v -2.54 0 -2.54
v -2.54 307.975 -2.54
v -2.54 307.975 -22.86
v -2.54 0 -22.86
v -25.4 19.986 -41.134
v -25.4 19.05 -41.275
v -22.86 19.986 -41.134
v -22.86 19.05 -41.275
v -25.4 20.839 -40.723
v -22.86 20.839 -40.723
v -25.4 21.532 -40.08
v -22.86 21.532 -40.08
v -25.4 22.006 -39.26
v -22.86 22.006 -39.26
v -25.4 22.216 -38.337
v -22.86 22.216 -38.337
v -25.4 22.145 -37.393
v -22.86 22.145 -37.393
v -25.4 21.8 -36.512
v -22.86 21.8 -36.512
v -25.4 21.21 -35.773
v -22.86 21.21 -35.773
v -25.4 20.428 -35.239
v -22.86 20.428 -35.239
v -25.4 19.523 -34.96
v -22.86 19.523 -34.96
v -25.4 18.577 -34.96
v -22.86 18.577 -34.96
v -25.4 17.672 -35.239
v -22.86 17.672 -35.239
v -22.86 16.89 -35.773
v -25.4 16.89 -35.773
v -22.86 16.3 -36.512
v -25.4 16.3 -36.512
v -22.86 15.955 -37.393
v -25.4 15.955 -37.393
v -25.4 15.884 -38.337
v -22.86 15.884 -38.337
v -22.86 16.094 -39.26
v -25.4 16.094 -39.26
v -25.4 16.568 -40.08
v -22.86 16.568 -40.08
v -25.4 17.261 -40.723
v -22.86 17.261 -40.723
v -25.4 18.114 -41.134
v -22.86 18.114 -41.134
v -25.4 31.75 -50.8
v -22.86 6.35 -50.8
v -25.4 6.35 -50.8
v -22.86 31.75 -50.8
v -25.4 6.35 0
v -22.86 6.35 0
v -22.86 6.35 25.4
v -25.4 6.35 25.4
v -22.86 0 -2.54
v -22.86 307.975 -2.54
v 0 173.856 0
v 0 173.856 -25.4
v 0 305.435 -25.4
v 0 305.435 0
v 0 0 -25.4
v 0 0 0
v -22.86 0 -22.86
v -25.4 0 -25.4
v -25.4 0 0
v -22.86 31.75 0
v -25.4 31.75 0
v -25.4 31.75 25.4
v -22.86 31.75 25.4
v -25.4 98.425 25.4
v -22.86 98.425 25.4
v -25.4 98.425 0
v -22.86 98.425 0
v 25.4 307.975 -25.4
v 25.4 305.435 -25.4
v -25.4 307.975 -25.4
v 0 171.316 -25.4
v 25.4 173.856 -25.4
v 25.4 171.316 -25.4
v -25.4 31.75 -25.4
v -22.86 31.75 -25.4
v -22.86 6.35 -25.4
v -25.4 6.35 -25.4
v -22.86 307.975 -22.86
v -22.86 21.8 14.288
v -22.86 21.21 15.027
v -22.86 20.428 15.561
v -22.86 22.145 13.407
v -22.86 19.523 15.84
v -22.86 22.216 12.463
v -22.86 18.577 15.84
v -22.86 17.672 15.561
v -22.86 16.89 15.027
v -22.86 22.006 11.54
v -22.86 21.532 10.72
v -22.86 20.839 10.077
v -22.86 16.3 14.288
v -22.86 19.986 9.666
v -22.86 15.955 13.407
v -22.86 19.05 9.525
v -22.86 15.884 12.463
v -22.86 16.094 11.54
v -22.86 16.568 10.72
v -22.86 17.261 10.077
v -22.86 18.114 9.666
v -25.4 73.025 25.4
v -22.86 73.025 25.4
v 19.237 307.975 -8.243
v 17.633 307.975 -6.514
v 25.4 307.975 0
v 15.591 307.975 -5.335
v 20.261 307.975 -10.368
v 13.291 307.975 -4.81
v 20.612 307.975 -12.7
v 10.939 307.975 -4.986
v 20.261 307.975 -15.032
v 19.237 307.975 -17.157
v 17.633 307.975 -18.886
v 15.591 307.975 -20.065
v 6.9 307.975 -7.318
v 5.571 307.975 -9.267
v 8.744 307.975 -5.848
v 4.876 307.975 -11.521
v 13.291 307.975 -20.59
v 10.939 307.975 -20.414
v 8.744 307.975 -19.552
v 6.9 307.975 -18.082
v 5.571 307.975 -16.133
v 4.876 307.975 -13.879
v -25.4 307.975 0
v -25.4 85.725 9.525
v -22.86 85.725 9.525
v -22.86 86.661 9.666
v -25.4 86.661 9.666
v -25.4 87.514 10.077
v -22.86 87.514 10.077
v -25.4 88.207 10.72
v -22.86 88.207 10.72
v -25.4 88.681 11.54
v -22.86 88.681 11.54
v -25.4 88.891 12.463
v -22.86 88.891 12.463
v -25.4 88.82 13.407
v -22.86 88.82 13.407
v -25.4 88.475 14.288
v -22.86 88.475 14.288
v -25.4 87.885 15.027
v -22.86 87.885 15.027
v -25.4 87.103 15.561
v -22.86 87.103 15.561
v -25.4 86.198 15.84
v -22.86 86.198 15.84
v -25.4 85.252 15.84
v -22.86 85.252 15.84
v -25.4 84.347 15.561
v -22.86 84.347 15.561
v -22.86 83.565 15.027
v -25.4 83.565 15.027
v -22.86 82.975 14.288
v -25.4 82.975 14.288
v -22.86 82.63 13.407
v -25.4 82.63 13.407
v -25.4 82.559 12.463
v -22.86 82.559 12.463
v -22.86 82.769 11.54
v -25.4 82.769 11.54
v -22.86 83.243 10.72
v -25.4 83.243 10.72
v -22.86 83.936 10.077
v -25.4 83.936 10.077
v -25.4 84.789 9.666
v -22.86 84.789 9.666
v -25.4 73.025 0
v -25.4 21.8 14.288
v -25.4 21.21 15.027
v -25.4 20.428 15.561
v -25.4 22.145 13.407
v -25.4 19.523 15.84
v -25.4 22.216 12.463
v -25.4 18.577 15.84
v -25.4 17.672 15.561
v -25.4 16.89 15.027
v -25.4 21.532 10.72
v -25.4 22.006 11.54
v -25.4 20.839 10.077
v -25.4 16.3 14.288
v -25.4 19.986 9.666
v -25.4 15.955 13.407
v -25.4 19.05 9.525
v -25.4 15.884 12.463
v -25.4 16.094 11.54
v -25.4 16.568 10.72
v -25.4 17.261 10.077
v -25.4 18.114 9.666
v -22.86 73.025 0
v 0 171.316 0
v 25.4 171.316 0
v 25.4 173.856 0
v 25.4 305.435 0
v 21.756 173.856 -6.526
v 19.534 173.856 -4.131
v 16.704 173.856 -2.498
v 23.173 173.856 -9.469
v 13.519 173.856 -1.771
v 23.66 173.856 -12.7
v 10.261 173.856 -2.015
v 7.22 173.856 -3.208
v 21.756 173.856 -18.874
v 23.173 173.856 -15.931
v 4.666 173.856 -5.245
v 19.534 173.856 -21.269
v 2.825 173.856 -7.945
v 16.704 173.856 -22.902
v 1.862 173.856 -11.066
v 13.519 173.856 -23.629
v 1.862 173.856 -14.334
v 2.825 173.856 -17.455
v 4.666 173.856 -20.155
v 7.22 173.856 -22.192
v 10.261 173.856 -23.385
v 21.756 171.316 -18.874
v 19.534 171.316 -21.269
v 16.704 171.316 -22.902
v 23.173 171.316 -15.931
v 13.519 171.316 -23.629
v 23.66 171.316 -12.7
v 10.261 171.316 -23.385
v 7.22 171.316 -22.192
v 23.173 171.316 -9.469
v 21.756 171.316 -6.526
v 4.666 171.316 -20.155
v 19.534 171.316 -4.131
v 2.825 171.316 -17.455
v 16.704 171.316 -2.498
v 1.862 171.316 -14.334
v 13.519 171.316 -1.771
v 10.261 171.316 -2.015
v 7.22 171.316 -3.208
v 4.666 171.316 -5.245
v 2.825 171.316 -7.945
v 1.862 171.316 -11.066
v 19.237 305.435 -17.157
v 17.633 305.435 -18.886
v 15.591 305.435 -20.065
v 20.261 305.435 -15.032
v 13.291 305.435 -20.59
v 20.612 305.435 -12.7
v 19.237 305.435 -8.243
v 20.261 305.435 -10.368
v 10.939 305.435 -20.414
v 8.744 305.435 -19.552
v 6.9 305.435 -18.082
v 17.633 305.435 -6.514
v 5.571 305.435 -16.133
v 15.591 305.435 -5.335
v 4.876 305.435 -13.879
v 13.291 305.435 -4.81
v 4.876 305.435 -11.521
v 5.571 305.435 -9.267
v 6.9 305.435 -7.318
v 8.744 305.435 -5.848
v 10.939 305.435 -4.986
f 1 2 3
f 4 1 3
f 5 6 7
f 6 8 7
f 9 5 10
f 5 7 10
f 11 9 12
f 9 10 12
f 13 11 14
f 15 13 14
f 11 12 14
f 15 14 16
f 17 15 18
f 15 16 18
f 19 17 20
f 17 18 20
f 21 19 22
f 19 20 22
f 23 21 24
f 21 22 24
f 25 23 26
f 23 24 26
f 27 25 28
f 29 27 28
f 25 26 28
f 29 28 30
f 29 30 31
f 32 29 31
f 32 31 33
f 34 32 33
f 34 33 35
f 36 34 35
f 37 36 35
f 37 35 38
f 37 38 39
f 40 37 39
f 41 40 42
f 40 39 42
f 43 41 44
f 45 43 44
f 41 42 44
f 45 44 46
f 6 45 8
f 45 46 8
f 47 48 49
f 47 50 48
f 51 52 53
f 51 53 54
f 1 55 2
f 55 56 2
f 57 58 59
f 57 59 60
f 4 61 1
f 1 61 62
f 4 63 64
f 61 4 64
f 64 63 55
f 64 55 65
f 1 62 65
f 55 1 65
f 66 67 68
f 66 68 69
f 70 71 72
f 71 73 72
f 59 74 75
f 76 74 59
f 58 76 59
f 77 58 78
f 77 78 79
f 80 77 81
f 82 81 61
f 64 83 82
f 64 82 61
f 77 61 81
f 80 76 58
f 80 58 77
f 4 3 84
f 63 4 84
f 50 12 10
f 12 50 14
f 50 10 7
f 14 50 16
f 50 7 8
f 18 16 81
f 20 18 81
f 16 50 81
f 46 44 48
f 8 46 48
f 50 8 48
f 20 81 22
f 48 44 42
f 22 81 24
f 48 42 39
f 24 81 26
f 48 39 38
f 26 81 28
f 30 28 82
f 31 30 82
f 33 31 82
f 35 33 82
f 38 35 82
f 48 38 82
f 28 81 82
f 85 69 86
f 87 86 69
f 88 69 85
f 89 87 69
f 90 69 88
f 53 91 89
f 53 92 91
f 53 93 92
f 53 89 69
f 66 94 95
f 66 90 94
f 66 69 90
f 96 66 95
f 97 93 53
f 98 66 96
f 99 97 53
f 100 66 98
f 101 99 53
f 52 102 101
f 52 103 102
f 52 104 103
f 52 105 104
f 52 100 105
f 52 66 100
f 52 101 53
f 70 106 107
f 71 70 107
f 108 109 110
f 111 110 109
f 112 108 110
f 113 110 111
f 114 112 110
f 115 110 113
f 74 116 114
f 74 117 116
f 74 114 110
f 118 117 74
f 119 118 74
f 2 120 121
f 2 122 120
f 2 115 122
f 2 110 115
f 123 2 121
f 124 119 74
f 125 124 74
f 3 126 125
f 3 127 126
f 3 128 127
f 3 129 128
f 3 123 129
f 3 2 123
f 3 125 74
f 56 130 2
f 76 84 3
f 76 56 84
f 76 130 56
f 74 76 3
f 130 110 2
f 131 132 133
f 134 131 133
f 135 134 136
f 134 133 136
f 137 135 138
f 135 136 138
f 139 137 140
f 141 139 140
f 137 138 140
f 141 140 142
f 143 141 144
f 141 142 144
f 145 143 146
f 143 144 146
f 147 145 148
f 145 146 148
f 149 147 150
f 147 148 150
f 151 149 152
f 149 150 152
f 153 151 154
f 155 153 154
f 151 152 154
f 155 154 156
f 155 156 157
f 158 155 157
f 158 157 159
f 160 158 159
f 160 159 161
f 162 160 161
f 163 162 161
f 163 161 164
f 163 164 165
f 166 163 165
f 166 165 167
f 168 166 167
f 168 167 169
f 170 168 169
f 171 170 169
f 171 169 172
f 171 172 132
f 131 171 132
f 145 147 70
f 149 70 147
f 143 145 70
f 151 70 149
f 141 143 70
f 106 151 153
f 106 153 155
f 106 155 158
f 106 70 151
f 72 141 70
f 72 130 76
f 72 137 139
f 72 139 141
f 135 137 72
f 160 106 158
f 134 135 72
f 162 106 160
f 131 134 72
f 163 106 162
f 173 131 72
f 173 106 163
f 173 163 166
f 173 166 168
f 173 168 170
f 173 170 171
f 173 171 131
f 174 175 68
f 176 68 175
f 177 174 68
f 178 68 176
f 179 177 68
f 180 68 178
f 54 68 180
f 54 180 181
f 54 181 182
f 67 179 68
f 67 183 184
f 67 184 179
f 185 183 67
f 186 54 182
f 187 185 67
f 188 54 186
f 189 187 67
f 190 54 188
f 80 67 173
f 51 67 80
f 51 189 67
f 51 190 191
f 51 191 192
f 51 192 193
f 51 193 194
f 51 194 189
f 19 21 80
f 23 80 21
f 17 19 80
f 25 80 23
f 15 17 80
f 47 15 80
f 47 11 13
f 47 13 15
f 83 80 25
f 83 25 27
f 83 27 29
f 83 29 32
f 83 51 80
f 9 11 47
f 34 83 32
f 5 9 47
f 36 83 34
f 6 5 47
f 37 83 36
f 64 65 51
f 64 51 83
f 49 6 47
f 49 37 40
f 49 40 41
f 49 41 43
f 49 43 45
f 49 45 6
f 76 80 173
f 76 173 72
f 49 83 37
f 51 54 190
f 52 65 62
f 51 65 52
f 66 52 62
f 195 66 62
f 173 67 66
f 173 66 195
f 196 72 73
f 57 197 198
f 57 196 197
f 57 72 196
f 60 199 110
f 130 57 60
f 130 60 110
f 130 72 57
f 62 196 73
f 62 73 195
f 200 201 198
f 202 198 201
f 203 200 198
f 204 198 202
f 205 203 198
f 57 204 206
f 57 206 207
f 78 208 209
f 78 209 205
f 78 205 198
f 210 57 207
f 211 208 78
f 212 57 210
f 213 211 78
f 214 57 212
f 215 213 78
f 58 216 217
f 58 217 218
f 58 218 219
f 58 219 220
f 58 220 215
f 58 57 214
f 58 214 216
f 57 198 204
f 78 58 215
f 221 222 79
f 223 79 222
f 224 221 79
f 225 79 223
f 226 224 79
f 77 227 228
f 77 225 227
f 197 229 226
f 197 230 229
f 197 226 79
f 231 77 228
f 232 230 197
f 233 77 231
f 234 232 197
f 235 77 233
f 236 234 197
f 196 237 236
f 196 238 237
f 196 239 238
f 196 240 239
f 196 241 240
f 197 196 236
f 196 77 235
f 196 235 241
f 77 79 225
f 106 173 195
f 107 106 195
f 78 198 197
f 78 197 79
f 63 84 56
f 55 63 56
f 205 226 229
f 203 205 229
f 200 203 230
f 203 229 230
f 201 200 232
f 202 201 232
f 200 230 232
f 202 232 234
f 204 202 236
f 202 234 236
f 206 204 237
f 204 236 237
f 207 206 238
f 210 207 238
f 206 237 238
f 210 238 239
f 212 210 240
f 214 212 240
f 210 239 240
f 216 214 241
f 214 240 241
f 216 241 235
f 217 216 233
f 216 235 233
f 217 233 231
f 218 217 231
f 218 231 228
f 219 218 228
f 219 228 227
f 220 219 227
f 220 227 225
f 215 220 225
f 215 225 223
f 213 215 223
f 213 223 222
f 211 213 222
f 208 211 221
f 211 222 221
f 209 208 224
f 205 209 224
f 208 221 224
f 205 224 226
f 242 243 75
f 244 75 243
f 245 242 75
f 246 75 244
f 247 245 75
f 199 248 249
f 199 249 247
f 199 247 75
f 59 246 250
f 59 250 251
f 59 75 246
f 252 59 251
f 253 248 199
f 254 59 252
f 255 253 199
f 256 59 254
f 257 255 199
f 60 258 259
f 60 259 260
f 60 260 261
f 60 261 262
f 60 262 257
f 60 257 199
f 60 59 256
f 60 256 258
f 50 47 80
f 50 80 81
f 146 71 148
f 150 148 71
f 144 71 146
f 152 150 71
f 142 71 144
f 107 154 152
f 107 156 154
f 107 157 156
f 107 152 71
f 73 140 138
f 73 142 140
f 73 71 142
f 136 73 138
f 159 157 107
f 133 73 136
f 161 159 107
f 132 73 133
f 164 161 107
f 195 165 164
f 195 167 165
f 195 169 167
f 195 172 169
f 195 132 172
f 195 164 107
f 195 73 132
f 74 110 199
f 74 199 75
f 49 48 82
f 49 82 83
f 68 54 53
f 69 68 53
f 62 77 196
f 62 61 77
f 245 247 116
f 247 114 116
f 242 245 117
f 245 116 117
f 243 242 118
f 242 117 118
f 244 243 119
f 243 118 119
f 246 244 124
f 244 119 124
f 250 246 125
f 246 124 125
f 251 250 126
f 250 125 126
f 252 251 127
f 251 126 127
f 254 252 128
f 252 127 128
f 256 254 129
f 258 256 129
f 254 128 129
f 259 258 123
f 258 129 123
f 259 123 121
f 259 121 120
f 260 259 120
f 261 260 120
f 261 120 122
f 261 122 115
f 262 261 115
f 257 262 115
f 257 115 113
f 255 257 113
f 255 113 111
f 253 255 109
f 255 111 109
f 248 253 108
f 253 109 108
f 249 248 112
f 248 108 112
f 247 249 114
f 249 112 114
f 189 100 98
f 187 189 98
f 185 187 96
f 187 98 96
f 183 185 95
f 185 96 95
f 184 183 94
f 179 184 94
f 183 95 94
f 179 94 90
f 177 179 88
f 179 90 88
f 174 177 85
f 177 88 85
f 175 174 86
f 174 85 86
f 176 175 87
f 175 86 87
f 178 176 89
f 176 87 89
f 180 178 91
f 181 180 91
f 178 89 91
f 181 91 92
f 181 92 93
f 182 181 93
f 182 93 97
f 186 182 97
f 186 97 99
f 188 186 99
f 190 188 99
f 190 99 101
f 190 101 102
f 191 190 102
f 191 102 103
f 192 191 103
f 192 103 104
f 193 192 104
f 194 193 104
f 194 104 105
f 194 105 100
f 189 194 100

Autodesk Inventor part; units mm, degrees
ref_plane "YZ Plane" through (0, 0, 0) normal (1, 0, 0) x (0, 1, 0)
ref_plane "XZ Plane" through (0, 0, 0) normal (0, 1, 0) x (-1, 0, 0)
ref_plane "XY Plane" through (0, 0, 0) normal (0, 0, 1) x (1, 0, 0)
sketch "Sketch1" plane through (0, 0, 0) normal (0, 1, 0) x (-1, 0, 0)
  line L0 (0, 0) -> (25.4, 0)
  line L1 (25.4, 0) -> (25.4, -25.4)
  line L2 (25.4, -25.4) -> (0, -25.4)
  line L3 (0, -25.4) -> (0, 0)
  dimension "d0" = 25.4
  dimension "d1" = 25.4
extrude "Extrusion1" add sketch "Sketch1" along normal blind 307.975
sketch "Sketch2" plane through (0, 307.975, 0) normal (0, 1, 0) x (1, 0, 0)
  line L0 (-22.86, 2.54) -> (-2.54, 2.54)
  line L1 (-2.54, 2.54) -> (-2.54, 22.86)
  line L2 (-2.54, 22.86) -> (-22.86, 22.86)
  line L3 (-22.86, 22.86) -> (-22.86, 2.54)
  line L4 (-25.4, 0) -> (0, 0) projected
  line L5 (-25.4, 25.4) -> (-25.4, 0) projected
  dimension "d4" = 20.32
  dimension "d5" = 20.32
  dimension "d6" = 2.54
  dimension "d7" = 2.54
extrude "Extrusion2" cut sketch "Sketch2" against normal blind 307.975
sketch "Sketch3" plane through (0, 0, 0) normal (1, 0, 0) x (0, 0, -1)
  line L0 (0, 0) -> (0, 307.975) projected
  line L1 (0, 307.975) -> (25.4, 307.975)
  line L2 (25.4, 307.975) -> (25.4, 305.435)
  line L3 (25.4, 305.435) -> (0, 305.435)
  line L4 (0, 305.435) -> (0, 307.975)
  dimension "d10" = 25.4
  dimension "d11" = 2.54
extrude "Extrusion3" add sketch "Sketch3" along normal blind 25.4
sketch "Sketch4" plane through (0, 307.975, 0) normal (0, 1, 0) x (1, 0, 0)
  circle A0 centre (12.7, 12.7) radius 7.9121
  line L0 (-25.4, 0) -> (25.4, 0) projected
  line L1 (25.4, 25.4) -> (25.4, 0) projected
  point P0 (0, 0)
  dimension "d14" = 15.8242
  dimension "d15" = 12.7
  dimension "d16" = 12.7
extrude "Extrusion4" cut sketch "Sketch4" against normal blind 25.4
sketch "Sketch5" plane through (0, 0, 0) normal (1, 0, 0) x (0, 0, -1)
  line L0 (0, 173.8561) -> (25.4, 173.8561)
  line L1 (25.4, 173.8561) -> (25.4, 171.3161)
  line L2 (25.4, 171.3161) -> (0, 171.3161)
  line L3 (0, 171.3161) -> (0, 173.8561)
  point P0 (0, 0)
  dimension "d19" = 25.4
  dimension "d20" = 2.54
extrude "Extrusion5" add sketch "Sketch5" along normal blind 25.4
sketch "Sketch6" plane through (0, 171.3161, -25.4) normal (0, -1, 0) x (1, 0, 0)
  circle A0 centre (12.7, 12.7) radius 10.9601
  line L0 (0, 0) -> (25.4, 0) projected
  line L1 (25.4, 25.4) -> (25.4, 0) projected
  point P0 (0, 25.4)
  dimension "d23" = 21.9202
  dimension "d24" = 12.7
  dimension "d25" = 1.7399
extrude "Extrusion6" cut sketch "Sketch6" against normal blind 25.4
sketch "Sketch7" plane through (-25.4, 0, 0) normal (0, 0, 1) x (1, 0, 0)
  line L0 (0, 0) -> (0, 307.975) projected
  line L1 (0, 31.75) -> (2.54, 31.75)
  line L2 (2.54, 31.75) -> (2.54, 6.35)
  line L3 (2.54, 6.35) -> (0, 6.35)
  line L4 (0, 6.35) -> (0, 31.75)
  line L5 (25.4, 0) -> (0, 0) projected
  line L6 (0, 0) -> (0, 307.975) projected
  line L7 (2.54, 307.975) -> (2.54, 0) projected
  line L8 (0, 73.025) -> (2.54, 73.025)
  line L9 (2.54, 73.025) -> (2.54, 98.425)
  line L10 (2.54, 98.425) -> (0, 98.425)
  line L11 (0, 98.425) -> (0, 73.025)
  dimension "d28" = 2.54
  dimension "d30" = 6.35
  dimension "d48" = 25.4
  dimension "d49" = 25.4
  dimension "d50" = 41.275
sketch "Sketch8" plane through (0, 0, -25.4) normal (0, 0, -1) x (-1, 0, 0)
  line L0 (25.4, 0) -> (25.4, 307.975) projected
  line L1 (25.4, 31.75) -> (22.86, 31.75)
  line L2 (22.86, 31.75) -> (22.86, 6.35)
  line L3 (22.86, 6.35) -> (25.4, 6.35)
  line L4 (25.4, 6.35) -> (25.4, 31.75)
  line L5 (25.4, 0) -> (0, 0) projected
  dimension "d33" = 2.54
  dimension "d34" = 25.4
  dimension "d35" = 31.75
extrude "Extrusion8" add sketch "Sketch8" along normal blind 25.4
sketch "Sketch10" plane through (-22.86, 6.35, -25.4) normal (1, 0, 0) x (0, 0, -1)
  circle A0 centre (12.7, 12.7) radius 3.175
  line L0 (0, 0) -> (25.4, 0) projected
  line L1 (0, -6.35) -> (0, 164.9661) projected
  point P0 (-25.4, -6.35)
  dimension "d43" = 6.35
  dimension "d44" = 12.7
  dimension "d45" = 12.7
extrude "Extrusion10" cut sketch "Sketch10" against normal blind 25.4
extrude "Extrusion11" add sketch "Sketch7" along normal blind 25.4 contours L0 L1 L2 L3 | L0 L10 L7 L8
sketch "Sketch11" plane through (-22.86, 73.025, 0) normal (1, 0, 0) x (0, 0, -1)
  circle A0 centre (-12.7, -53.975) radius 3.175
  line L0 (0, -41.275) -> (-25.4, -41.275) projected
  line L1 (-12.7, -41.275) -> (-12.7, -53.975) construction
  line L2 (-12.7, -53.975) -> (-25.4, -53.975) construction
  circle A1 centre (-12.7, 12.7) radius 3.175
  line L3 (-12.7, 12.7) -> (-12.7, 25.4) construction
  line L4 (0, 25.4) -> (-25.4, 25.4) projected
  line L5 (-12.7, 12.7) -> (-25.4, 12.7) construction
  point P0 (0, -73.025)
  dimension "d53" = 6.35
  dimension "d54" = 12.7
  dimension "d55" = 6.35
  dimension "d56" = 12.7
extrude "Extrusion12" cut sketch "Sketch11" against normal blind 25.4
properties part number "Mount for Control Panel"
